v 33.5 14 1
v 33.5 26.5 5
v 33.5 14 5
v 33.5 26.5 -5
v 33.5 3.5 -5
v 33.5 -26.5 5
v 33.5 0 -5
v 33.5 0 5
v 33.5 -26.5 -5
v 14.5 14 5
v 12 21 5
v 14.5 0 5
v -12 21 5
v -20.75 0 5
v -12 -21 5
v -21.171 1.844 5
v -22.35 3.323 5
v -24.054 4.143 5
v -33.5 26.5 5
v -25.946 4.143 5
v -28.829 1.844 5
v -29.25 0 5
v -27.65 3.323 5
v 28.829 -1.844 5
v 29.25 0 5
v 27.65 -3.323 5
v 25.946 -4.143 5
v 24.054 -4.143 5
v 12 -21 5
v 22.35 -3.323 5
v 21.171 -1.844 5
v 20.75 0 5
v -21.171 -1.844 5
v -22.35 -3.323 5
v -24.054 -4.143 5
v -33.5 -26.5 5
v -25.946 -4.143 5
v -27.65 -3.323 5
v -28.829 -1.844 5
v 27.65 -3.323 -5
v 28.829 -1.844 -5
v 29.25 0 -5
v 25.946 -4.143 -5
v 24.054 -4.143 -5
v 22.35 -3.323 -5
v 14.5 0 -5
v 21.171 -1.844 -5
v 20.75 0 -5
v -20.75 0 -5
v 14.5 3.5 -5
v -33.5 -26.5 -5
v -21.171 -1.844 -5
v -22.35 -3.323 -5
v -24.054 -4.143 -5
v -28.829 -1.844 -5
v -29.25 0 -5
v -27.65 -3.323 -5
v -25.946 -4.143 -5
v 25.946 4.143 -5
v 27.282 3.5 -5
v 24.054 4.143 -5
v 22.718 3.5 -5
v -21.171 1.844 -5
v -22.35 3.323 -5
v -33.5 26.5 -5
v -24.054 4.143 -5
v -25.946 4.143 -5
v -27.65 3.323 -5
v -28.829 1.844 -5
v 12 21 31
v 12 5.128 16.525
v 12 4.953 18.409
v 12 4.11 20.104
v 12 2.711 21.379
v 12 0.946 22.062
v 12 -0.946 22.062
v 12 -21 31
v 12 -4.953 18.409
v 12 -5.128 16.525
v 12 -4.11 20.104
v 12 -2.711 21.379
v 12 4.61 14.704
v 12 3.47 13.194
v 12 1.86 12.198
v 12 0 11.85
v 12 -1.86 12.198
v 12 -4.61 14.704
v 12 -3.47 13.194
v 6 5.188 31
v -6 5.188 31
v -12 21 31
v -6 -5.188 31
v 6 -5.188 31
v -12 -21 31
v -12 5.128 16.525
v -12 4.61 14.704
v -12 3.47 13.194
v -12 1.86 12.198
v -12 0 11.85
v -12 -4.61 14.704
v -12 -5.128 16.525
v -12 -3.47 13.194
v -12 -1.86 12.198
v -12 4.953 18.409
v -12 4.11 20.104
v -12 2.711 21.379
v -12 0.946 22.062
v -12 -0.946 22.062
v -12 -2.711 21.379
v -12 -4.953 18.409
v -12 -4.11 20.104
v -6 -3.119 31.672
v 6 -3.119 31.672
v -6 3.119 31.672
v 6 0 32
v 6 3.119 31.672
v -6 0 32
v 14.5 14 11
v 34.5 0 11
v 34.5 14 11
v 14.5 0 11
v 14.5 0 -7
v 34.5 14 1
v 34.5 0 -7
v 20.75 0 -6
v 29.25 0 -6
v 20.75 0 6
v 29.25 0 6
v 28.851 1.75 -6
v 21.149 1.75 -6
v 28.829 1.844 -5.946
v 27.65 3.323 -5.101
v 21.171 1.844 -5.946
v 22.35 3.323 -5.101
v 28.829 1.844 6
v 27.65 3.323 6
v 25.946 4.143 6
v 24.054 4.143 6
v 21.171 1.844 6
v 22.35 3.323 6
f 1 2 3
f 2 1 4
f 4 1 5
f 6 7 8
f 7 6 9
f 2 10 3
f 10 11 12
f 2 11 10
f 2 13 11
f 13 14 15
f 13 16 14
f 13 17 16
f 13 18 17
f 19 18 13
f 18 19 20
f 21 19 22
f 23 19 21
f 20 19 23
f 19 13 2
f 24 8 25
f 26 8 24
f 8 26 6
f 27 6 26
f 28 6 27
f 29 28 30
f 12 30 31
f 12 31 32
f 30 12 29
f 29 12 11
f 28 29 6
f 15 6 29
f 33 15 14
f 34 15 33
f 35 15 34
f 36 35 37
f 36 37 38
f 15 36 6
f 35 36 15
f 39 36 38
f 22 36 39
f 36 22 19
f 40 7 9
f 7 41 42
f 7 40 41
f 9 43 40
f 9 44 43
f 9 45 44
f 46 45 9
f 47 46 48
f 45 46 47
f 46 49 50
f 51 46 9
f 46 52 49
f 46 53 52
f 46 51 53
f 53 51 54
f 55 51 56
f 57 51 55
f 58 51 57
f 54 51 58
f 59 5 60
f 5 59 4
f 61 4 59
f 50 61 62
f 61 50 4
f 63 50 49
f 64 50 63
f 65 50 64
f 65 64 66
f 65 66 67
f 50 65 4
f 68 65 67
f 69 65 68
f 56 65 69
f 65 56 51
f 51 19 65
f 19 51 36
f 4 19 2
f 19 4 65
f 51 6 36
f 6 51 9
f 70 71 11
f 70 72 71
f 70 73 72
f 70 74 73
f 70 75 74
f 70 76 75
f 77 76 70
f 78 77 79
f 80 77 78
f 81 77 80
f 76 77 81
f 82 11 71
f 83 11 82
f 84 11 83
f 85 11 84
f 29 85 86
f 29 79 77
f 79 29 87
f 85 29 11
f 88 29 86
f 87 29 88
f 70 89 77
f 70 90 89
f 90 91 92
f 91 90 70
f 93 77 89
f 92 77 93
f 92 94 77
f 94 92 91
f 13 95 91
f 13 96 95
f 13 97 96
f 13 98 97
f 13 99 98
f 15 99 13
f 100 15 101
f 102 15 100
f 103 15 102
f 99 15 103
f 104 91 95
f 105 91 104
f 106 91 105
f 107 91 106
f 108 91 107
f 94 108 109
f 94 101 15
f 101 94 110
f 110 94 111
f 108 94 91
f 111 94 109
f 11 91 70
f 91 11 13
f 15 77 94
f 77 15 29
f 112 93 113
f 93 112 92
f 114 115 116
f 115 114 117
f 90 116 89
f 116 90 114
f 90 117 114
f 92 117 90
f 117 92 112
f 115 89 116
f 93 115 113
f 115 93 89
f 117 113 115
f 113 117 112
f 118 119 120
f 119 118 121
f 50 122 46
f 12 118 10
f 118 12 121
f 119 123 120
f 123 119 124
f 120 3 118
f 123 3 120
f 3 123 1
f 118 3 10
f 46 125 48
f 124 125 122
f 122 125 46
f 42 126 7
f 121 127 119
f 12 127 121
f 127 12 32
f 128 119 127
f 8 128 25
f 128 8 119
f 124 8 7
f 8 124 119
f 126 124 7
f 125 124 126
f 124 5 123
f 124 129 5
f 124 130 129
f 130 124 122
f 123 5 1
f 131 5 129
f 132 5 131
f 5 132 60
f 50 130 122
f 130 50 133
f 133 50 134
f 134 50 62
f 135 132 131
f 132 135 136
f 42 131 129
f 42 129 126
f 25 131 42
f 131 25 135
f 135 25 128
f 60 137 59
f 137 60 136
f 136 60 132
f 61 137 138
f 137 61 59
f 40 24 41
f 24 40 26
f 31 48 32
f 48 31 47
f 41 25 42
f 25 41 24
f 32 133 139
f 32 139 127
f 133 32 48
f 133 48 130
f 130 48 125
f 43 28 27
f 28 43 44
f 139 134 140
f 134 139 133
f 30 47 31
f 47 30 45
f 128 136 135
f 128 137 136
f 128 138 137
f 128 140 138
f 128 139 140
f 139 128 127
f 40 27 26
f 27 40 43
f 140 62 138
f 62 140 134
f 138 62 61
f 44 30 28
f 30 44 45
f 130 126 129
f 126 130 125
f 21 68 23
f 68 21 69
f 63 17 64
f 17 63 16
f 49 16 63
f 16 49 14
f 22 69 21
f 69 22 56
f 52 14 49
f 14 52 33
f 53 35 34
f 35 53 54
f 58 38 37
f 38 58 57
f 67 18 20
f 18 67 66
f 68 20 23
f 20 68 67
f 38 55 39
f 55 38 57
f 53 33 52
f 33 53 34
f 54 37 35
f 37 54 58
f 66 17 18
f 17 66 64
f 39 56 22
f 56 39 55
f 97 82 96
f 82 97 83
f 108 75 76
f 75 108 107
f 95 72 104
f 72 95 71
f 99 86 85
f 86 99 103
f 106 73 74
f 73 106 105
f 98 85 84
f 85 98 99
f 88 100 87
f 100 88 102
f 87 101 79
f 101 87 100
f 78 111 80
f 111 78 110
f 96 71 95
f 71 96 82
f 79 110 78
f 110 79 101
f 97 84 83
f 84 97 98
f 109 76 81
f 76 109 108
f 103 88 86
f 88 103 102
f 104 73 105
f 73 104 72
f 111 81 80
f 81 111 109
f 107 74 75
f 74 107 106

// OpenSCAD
// Parameters
shaft_diameter = 10; //[5:20:0.1]
shaft_clearance = 0.3; //[0.1:0.8:0.05]
base_length = 67; //[34:134:0.5]
base_width = 53; //[27:106:0.5]
base_thickness = 10; //[5:20:0.5]
overall_height = 36; //[20:72:0.5]
bearing_outer_diameter = 30; //[18:60:0.5]
bearing_width = 12; //[6:24:0.5]
housing_wall_thickness = 6; //[3:12:0.5]
mount_hole_diameter = 8; //[4:16:0.5]
mount_hole_clearance = 0.5; //[0.2:1.2:0.1]
mount_hole_spacing_length = 50; //[30:100:0.5]
mount_hole_spacing_width = 0; //[0:20:0.5]
mount_hole_type = 0; //[0:1:1]
fillet_radius = 1.5; //[0.5:4:0.5]
minkowski_quality_sphere_radius = 0.8; //[0.3:2:0.1]
connect_overlap = 1; //[0.5:2:0.1]
trapezoid_base = 18; //[9:36:0.5]
trapezoid_top = 10; //[5:20:0.5]
trapezoid_height = 14; //[7:28:0.5]
trapezoid_extrude = 20; //[10:40:0.5]

// Right Trapezoid
module right_trapezoid() {
  color("Silver") {
    translate([base_length/2 - trapezoid_extrude/2 + connect_overlap, 0, base_thickness/2 + trapezoid_height/2 - connect_overlap])
    rotate([0, 90, 0])
    linear_extrude(height=trapezoid_extrude, center=true) {
      polygon(points=[
        [0, 0],
        [trapezoid_base, 0],
        [trapezoid_top, trapezoid_height],
        [0, trapezoid_height]
      ]);
    }
  }
}

// Sbr Bearing Block Assembly
module sbr_bearing_block_assembly() {
  color("DimGray") {
    // Placeholder for detailed geometry
    cube([20, 20, 20], center=true);
  }
}

// Kp Pillow Block Assembly
module kp_pillow_block_assembly() {
  color("Black") {
    // Base Plate
    translate([0, 0, 0])
    cube([base_length, base_width, base_thickness], center=true);
    
    // Housing
    translate([0, 0, base_thickness/2 + (overall_height - base_thickness + connect_overlap)/2 - connect_overlap])
    cube([bearing_width + 2*housing_wall_thickness, bearing_outer_diameter + 2*housing_wall_thickness, overall_height - base_thickness + connect_overlap], center=true);
    
    // Bearing Seat Boss
    translate([0, 0, base_thickness/2 + (overall_height - base_thickness) - (bearing_outer_diameter/2) + connect_overlap])
    rotate([0, 90, 0])
    cylinder(r=bearing_outer_diameter/2, h=bearing_width, center=true);
  }
}

// Scs Bearing Block
module scs_bearing_block() {
  color("DimGray") {
    // Placeholder for detailed geometry
    cube([20, 20, 20], center=true);
  }
}

// Kp Pillow Block Hole Positions
module kp_pillow_block_hole_positions() {
  color("Silver") {
    // Mounting Holes
    translate([mount_hole_spacing_length/2, mount_hole_spacing_width, 0])
    cylinder(r=(mount_hole_diameter + mount_hole_clearance)/2, h=base_thickness + 2*connect_overlap, center=true);
    
    translate([-mount_hole_spacing_length/2, mount_hole_spacing_width, 0])
    cylinder(r=(mount_hole_diameter + mount_hole_clearance)/2, h=base_thickness + 2*connect_overlap, center=true);
  }
}

// Assembly
module assembly() {
  difference() {
    union() {
      kp_pillow_block_assembly();
      right_trapezoid();
    }
    kp_pillow_block_hole_positions();
    translate([0, 0, base_thickness/2 + (overall_height - base_thickness) - (bearing_outer_diameter/2) + connect_overlap])
    rotate([0, 90, 0])
    cylinder(r=(shaft_diameter + shaft_clearance)/2, h=base_length + 2*housing_wall_thickness, center=true);
  }
}

assembly();
